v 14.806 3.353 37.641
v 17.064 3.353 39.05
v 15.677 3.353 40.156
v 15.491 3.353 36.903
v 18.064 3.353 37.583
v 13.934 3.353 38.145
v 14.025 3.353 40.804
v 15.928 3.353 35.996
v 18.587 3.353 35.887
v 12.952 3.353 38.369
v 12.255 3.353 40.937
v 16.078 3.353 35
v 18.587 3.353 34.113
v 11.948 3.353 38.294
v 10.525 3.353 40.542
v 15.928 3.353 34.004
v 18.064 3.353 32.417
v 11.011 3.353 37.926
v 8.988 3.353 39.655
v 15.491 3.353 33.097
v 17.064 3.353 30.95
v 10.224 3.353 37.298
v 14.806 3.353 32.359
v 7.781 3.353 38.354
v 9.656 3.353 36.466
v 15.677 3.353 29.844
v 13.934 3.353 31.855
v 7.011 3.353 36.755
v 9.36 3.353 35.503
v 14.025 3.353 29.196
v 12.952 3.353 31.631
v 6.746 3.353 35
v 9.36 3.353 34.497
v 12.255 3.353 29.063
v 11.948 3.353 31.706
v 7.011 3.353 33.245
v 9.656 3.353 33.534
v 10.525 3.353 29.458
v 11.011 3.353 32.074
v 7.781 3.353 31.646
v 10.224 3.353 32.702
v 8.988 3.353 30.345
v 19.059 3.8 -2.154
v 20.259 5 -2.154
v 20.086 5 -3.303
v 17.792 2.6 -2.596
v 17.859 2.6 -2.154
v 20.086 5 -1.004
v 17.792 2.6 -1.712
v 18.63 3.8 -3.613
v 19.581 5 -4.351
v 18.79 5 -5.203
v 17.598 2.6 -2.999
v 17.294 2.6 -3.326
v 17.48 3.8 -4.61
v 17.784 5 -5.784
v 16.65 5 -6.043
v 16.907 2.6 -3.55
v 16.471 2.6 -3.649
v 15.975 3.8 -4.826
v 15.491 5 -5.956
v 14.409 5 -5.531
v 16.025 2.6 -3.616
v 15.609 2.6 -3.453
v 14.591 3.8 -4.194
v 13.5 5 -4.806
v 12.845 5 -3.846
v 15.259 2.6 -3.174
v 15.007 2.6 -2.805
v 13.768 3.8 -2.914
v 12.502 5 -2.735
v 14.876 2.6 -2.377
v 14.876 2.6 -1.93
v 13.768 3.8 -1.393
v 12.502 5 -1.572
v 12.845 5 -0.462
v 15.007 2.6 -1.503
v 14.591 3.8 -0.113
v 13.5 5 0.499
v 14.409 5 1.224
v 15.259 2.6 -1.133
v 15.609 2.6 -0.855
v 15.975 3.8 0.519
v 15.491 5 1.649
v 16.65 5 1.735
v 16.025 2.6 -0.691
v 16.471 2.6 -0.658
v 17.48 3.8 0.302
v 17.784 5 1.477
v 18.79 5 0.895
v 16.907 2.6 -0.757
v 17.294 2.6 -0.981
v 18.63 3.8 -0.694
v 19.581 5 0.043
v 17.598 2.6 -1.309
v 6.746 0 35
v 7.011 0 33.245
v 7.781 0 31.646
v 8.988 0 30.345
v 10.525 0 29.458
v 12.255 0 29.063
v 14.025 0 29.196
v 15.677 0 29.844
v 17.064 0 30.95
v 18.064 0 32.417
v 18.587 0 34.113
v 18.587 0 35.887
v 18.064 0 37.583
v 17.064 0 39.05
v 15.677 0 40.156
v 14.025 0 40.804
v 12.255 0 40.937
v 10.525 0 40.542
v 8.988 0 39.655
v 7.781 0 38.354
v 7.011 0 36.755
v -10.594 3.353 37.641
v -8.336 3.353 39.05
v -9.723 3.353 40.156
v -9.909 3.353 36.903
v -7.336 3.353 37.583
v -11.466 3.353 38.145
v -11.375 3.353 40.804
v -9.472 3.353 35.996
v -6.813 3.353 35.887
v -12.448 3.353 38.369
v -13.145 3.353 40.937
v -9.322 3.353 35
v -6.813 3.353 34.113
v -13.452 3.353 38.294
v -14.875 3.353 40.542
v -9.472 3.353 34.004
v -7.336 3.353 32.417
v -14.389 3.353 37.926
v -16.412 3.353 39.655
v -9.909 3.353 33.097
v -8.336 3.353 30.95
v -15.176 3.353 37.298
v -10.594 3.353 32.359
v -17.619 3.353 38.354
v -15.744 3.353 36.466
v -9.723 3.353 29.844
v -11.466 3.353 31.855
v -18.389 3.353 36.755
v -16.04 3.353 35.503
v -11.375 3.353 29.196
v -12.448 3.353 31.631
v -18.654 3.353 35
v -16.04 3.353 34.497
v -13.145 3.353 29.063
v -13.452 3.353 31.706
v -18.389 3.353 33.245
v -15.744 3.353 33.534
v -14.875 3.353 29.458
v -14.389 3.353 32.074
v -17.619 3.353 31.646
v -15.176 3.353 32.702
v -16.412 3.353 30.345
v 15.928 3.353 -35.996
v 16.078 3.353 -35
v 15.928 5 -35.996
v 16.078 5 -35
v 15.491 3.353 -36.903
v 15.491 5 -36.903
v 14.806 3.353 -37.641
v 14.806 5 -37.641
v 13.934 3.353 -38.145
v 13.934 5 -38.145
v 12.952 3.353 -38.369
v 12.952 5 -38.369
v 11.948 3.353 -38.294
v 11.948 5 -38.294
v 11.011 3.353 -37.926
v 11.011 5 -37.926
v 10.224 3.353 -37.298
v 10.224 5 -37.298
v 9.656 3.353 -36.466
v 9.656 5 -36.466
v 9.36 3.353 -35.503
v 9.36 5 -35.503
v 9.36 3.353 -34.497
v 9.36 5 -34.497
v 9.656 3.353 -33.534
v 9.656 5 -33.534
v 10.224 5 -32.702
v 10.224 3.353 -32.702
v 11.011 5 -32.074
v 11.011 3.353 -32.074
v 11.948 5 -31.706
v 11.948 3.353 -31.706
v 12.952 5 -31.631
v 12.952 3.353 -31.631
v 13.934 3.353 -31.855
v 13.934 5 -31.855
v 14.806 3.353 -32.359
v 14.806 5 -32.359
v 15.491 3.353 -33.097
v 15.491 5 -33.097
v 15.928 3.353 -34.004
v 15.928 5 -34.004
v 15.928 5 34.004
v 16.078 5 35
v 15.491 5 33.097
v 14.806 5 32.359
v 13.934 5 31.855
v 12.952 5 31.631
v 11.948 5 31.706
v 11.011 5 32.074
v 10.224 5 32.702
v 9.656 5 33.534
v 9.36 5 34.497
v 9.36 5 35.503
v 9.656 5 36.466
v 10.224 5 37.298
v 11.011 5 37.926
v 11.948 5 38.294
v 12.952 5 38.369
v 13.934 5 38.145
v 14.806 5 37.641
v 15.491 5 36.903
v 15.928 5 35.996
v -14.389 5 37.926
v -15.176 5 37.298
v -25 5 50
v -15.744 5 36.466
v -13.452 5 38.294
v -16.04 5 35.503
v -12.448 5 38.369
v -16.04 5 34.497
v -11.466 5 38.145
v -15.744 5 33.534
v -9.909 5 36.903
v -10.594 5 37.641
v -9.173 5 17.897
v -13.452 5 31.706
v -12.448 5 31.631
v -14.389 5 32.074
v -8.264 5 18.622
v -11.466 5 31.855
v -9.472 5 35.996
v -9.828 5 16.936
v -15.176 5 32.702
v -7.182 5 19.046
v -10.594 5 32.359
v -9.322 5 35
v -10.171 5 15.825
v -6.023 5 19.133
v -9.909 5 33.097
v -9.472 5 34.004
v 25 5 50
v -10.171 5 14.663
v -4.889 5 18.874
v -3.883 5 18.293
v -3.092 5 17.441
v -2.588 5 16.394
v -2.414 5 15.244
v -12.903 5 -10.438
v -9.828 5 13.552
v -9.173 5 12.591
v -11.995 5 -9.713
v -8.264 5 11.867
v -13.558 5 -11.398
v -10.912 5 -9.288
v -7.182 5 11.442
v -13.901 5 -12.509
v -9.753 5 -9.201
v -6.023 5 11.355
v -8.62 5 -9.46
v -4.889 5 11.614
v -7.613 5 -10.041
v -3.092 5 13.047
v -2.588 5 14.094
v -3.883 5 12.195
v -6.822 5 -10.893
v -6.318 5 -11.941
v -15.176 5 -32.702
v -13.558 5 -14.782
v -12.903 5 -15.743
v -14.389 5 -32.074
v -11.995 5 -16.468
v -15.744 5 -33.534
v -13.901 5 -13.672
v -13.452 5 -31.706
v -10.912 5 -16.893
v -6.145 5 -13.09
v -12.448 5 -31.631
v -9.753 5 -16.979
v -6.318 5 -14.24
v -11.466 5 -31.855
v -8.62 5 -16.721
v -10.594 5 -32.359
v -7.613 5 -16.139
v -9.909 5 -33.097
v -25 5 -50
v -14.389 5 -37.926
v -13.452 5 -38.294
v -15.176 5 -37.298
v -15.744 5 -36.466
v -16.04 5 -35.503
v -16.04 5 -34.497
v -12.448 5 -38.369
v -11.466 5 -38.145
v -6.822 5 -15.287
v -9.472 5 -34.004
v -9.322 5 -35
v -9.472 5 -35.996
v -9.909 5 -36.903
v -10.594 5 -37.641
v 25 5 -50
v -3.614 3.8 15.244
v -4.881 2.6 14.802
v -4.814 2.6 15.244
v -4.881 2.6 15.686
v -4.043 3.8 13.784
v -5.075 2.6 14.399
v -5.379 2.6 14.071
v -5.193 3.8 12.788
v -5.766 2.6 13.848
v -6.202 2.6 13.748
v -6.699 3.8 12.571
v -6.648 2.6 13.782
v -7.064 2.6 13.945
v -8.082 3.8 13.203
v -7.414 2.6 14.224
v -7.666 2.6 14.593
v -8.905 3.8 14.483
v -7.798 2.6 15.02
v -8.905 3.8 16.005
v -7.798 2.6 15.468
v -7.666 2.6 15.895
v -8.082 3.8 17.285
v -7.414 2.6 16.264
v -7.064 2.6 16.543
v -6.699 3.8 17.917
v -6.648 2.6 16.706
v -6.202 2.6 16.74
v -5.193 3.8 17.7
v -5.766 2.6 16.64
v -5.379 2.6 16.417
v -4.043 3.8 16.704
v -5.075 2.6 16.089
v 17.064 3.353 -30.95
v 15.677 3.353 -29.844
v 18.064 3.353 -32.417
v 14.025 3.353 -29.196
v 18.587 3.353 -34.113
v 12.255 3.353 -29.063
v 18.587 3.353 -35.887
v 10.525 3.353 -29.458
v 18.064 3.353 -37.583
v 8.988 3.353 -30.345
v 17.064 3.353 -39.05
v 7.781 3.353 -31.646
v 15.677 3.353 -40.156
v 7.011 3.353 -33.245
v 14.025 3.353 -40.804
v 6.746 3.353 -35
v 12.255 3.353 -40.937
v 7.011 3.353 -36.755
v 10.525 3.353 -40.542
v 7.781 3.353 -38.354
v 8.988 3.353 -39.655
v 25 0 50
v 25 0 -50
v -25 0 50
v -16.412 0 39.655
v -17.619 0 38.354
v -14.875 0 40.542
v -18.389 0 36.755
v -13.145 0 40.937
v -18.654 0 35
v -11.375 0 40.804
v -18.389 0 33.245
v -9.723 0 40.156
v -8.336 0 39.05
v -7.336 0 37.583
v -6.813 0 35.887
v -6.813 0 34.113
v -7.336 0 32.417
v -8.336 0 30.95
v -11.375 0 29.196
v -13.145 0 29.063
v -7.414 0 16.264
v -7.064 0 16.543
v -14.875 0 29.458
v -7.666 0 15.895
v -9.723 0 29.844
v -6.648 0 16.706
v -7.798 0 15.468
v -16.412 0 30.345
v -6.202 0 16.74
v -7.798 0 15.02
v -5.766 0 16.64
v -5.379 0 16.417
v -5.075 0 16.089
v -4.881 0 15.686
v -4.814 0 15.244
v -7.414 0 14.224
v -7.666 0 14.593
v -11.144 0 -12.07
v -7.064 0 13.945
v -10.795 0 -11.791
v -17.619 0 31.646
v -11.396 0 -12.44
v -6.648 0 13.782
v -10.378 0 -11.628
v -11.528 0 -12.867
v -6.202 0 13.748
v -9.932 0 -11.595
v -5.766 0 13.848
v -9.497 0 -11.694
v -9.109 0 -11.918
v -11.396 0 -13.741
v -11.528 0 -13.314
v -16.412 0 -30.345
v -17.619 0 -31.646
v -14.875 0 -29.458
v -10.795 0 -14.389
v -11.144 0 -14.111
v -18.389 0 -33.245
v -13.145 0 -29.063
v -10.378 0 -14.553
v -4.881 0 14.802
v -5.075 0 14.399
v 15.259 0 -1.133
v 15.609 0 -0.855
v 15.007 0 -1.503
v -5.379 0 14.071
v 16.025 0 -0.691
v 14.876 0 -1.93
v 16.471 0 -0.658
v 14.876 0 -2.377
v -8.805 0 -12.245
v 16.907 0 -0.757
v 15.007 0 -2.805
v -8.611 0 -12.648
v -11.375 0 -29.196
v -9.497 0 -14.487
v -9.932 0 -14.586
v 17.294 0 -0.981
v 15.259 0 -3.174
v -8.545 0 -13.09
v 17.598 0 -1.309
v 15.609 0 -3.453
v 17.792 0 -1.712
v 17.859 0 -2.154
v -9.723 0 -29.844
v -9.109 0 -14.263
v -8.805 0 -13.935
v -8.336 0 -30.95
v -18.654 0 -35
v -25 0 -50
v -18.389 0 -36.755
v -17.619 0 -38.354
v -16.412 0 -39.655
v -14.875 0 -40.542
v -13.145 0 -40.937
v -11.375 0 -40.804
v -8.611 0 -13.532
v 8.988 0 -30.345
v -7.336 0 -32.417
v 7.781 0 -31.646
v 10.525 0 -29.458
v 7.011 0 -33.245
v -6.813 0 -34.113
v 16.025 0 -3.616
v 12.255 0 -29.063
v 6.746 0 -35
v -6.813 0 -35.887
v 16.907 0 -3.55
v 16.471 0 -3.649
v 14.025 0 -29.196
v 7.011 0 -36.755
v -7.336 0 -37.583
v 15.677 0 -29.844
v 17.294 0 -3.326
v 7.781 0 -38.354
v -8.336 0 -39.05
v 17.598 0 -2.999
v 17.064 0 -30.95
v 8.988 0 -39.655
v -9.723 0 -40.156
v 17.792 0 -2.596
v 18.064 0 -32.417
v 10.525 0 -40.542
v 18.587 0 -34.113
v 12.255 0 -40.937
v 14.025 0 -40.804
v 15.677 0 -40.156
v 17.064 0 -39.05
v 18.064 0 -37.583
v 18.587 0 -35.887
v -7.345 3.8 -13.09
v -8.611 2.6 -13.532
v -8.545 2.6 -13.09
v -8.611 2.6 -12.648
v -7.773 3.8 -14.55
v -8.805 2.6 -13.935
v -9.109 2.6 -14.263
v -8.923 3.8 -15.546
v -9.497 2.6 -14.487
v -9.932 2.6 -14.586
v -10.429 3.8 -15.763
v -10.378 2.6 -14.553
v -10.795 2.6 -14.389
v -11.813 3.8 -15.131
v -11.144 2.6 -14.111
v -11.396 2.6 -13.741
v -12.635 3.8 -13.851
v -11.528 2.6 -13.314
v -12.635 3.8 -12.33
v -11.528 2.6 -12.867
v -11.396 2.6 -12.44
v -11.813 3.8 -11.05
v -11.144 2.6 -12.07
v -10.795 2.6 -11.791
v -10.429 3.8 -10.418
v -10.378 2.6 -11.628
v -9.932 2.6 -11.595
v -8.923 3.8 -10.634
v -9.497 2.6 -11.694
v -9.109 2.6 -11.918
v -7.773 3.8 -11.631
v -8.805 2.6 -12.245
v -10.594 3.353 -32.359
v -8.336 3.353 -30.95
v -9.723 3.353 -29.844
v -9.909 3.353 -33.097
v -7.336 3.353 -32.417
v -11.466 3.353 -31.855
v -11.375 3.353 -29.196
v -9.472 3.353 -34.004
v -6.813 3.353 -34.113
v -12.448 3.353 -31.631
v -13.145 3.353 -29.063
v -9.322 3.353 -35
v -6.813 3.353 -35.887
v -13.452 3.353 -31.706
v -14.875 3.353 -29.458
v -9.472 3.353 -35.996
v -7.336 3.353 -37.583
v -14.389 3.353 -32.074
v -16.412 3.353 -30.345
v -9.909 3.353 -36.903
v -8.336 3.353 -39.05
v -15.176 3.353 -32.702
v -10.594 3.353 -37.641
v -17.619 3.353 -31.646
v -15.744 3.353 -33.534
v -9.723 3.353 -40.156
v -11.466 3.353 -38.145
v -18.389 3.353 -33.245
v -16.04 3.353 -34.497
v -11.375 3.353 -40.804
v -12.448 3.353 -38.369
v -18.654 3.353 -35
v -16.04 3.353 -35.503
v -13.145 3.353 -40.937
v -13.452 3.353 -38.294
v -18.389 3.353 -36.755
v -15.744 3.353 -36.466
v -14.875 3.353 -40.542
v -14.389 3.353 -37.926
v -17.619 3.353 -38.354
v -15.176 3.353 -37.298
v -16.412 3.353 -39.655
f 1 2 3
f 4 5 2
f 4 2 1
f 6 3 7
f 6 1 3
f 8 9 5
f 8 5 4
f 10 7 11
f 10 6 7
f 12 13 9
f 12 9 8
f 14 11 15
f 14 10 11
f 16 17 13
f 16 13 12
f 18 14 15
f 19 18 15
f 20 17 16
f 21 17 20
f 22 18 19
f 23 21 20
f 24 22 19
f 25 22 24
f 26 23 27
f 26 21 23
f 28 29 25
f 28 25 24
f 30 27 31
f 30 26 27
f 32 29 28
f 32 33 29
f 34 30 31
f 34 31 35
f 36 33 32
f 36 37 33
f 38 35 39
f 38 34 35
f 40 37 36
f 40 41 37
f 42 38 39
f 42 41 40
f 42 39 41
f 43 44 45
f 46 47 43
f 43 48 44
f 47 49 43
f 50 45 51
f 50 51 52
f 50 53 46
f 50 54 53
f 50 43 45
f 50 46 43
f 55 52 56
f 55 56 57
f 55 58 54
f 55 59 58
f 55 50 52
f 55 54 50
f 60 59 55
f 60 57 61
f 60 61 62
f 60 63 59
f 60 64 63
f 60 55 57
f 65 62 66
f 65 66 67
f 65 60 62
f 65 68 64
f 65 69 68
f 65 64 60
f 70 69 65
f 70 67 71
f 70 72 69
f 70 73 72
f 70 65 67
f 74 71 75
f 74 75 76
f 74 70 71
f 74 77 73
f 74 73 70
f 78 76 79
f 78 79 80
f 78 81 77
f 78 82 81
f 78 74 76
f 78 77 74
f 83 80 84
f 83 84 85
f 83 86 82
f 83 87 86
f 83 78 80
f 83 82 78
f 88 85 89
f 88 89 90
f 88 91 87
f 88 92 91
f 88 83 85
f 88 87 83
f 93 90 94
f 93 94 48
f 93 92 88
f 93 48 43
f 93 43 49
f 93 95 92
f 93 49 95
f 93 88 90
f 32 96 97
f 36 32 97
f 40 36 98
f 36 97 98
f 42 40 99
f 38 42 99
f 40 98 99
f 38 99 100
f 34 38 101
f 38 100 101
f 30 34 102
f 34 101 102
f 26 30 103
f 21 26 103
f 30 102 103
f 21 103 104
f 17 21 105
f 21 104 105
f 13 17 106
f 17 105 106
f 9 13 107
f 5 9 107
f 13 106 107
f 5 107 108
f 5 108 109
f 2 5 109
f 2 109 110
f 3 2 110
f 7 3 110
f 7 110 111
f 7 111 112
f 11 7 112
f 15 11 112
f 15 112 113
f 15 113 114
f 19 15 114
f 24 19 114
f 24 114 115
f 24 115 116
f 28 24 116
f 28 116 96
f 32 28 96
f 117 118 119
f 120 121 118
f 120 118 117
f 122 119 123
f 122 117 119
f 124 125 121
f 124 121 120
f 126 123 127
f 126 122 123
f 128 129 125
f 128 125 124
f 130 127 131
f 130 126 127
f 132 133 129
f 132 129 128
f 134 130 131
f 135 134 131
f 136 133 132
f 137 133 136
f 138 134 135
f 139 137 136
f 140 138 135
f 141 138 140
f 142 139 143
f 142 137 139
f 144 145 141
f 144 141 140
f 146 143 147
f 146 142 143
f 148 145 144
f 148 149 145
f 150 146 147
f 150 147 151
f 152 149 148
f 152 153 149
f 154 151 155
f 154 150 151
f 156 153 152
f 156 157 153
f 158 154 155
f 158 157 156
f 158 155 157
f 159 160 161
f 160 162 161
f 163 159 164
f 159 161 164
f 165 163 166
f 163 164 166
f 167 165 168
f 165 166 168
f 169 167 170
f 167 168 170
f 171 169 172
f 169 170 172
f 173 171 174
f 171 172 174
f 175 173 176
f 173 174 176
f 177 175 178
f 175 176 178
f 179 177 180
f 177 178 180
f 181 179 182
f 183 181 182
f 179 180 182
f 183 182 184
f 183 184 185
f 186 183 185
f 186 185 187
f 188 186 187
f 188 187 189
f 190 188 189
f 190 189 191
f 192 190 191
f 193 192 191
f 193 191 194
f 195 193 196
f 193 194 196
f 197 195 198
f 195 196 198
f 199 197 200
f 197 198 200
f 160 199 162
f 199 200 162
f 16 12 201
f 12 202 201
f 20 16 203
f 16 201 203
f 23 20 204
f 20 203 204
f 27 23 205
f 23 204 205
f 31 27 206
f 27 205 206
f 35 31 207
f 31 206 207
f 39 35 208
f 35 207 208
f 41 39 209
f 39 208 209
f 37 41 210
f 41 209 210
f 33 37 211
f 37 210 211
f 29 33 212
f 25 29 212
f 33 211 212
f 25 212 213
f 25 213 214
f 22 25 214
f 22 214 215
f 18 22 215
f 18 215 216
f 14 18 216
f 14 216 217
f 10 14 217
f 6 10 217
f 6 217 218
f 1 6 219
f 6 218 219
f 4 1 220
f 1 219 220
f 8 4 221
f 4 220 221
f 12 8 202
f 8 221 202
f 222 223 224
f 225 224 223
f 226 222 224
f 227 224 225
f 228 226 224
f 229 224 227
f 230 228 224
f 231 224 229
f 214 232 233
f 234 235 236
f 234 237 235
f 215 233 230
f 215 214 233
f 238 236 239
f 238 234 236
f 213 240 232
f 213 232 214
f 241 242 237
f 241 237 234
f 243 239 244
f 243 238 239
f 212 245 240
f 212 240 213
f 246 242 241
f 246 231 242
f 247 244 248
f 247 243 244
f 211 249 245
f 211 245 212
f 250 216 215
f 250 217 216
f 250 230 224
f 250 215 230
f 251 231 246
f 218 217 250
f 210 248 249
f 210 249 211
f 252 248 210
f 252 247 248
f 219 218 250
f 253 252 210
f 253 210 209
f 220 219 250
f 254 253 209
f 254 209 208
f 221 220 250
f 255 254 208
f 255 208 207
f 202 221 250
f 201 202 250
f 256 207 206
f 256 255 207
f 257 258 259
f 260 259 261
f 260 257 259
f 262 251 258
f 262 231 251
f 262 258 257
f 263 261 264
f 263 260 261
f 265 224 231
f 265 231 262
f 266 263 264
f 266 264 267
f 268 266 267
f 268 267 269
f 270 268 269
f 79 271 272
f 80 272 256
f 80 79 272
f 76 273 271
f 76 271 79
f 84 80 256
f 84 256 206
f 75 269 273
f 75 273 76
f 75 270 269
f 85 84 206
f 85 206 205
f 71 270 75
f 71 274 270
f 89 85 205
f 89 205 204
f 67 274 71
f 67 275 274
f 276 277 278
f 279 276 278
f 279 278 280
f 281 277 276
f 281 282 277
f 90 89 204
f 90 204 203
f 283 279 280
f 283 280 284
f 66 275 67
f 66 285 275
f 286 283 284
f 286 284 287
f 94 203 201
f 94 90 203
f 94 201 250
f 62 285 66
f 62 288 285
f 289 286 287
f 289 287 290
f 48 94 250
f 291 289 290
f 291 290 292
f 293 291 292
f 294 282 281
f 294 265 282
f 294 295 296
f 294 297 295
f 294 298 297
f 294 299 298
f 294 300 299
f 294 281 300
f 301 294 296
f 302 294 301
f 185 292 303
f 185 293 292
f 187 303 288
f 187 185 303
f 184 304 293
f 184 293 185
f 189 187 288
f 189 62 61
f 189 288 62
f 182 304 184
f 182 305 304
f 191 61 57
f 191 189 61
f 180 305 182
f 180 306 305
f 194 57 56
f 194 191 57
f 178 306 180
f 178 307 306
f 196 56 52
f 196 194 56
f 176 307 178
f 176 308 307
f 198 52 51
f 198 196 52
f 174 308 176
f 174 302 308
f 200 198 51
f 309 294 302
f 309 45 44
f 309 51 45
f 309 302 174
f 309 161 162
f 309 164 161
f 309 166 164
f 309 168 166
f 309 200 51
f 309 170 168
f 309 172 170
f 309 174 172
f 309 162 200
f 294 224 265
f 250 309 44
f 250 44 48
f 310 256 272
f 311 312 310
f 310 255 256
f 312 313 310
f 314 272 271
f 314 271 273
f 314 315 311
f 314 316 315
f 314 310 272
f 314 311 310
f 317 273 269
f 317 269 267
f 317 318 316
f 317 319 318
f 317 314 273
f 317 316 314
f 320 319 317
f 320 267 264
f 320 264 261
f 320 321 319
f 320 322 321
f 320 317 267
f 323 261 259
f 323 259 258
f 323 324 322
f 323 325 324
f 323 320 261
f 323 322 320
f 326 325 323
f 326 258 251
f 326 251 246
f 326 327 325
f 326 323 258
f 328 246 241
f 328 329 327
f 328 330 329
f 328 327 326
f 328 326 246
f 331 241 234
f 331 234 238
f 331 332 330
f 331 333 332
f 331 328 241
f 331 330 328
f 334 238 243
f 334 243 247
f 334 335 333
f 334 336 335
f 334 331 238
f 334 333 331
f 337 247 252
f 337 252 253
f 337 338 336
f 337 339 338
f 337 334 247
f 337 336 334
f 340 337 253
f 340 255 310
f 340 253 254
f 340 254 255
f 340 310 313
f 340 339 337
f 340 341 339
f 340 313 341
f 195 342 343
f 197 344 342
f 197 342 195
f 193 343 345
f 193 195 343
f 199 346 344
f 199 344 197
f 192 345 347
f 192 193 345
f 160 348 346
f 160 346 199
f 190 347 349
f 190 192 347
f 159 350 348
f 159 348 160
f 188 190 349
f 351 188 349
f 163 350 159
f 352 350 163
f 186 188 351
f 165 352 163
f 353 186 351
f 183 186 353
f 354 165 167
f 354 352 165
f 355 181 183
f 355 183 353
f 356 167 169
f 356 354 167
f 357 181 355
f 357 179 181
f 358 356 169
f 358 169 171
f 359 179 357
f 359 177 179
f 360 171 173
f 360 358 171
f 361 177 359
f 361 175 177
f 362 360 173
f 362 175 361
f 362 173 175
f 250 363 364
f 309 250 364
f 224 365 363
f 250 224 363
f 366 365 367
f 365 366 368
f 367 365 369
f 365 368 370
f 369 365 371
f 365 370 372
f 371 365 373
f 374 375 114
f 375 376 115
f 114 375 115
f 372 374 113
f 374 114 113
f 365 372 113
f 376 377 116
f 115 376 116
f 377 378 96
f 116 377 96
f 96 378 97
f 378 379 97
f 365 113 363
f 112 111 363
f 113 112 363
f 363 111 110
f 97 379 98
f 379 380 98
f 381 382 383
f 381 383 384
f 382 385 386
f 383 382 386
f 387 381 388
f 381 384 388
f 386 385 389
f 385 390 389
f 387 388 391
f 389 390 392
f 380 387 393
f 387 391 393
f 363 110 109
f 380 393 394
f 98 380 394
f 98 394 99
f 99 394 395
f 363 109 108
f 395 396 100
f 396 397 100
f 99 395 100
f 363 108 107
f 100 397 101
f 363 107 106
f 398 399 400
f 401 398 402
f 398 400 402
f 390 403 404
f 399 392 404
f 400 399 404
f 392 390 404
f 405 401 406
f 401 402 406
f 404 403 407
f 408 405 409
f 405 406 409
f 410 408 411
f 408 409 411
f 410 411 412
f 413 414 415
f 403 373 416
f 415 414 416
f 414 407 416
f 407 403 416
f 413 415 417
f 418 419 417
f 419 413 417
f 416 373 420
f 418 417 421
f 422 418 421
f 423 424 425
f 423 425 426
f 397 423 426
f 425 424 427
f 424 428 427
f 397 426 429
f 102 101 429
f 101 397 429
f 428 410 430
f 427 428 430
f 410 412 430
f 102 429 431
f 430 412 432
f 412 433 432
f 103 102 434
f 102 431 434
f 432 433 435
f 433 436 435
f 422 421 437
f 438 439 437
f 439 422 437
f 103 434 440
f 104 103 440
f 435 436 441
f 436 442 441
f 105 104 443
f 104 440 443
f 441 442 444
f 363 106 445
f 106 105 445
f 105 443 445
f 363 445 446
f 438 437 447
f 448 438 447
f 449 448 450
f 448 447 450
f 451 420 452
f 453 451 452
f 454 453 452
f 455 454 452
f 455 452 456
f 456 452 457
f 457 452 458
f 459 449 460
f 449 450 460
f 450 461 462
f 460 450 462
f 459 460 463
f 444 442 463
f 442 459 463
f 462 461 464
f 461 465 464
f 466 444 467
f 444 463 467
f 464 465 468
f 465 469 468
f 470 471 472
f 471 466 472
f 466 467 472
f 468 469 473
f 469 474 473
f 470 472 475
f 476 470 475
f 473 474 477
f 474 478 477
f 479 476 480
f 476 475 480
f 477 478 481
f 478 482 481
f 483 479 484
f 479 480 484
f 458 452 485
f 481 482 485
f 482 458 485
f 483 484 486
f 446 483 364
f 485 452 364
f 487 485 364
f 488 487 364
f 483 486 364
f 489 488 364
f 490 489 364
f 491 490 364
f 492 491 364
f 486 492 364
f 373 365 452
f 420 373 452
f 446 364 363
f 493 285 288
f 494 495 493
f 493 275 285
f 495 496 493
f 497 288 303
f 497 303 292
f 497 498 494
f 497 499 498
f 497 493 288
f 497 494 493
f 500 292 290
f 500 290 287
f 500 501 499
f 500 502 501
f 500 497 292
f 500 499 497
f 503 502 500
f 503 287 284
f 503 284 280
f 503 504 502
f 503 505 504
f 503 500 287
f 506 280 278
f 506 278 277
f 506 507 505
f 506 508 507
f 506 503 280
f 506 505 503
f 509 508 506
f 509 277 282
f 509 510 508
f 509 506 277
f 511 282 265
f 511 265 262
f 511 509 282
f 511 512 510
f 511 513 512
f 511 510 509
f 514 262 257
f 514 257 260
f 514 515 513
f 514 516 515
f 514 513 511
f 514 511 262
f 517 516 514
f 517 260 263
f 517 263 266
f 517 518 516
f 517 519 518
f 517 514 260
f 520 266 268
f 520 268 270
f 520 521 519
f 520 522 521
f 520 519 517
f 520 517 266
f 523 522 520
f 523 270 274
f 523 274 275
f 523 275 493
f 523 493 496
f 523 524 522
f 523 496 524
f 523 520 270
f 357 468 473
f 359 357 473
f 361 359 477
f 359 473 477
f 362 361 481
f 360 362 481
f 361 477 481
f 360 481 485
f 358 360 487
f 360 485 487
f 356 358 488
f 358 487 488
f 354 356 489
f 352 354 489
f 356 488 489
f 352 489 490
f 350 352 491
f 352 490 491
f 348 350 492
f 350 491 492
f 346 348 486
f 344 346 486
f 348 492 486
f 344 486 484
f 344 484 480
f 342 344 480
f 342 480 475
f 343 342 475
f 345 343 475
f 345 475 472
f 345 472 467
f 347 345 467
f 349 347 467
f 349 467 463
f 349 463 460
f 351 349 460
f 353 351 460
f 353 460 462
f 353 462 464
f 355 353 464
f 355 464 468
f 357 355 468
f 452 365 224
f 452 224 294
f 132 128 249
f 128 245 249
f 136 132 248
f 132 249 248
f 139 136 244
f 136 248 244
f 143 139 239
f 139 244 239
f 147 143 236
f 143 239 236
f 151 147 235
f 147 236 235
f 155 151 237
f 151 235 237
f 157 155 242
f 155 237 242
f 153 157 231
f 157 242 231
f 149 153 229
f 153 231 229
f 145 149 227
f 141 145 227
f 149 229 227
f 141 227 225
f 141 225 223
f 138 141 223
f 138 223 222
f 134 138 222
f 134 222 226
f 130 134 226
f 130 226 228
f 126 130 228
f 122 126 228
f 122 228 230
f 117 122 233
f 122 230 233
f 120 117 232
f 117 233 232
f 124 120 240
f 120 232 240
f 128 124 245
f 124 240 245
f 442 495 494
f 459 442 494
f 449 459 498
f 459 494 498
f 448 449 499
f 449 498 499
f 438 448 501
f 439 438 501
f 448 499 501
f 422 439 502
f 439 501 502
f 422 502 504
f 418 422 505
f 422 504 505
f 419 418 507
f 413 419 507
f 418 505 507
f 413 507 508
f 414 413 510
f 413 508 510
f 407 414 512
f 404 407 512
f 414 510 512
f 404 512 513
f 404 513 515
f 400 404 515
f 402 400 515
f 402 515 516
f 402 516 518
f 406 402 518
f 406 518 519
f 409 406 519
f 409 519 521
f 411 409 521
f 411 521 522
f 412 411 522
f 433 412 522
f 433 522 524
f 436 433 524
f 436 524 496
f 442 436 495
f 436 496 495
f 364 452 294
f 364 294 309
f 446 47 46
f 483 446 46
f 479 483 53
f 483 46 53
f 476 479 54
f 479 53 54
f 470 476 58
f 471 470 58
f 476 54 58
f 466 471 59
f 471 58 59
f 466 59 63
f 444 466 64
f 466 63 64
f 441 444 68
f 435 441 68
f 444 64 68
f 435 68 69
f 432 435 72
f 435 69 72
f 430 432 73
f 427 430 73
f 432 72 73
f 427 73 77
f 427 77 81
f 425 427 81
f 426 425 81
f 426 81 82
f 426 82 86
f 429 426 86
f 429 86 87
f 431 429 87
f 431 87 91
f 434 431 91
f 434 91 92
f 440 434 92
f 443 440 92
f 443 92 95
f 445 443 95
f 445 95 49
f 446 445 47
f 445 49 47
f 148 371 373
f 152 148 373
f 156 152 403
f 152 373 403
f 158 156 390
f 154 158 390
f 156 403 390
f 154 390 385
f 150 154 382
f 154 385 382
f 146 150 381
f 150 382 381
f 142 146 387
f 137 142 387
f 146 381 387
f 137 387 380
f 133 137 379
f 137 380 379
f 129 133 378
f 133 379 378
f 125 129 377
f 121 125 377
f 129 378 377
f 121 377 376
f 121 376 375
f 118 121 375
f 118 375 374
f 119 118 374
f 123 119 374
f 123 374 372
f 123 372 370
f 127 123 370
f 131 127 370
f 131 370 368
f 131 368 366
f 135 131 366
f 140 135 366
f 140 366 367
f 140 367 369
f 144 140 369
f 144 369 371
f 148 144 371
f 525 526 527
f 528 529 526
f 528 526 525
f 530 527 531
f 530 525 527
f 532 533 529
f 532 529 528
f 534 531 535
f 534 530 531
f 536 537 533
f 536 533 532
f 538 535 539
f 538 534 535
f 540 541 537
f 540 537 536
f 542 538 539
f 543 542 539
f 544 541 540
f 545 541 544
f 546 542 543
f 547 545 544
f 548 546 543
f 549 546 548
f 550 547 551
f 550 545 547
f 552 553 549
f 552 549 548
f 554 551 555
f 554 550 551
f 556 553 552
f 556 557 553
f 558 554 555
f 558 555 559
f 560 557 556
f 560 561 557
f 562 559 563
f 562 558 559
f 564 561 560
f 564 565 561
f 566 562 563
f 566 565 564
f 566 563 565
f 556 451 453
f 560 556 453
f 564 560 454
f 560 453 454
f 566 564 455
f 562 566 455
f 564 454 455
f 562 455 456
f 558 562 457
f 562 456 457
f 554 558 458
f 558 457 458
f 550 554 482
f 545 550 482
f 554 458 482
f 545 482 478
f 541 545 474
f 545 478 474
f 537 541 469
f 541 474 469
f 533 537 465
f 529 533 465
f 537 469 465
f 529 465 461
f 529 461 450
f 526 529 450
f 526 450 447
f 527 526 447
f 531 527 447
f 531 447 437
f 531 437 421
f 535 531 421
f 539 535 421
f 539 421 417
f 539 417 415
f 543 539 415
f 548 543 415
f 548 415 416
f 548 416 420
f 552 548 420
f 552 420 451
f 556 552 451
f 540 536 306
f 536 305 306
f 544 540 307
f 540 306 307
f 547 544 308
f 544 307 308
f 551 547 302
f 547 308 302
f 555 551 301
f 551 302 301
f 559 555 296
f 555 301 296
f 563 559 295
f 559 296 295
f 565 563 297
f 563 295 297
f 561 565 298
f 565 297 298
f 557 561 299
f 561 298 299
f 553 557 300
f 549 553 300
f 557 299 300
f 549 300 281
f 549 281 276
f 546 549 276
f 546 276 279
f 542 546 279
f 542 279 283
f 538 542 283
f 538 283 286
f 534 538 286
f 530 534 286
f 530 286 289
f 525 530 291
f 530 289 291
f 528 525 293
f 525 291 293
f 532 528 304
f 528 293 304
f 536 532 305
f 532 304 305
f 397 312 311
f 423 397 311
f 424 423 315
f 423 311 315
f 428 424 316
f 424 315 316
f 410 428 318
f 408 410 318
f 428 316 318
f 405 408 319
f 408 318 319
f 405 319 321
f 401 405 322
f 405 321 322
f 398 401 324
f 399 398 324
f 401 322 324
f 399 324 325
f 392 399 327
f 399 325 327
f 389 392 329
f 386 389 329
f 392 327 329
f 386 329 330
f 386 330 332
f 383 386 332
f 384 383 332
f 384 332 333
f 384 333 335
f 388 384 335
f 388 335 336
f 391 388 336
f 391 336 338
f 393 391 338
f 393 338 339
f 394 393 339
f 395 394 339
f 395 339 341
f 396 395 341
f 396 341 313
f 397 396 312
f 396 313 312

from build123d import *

# Parameters (mm, degrees)
SKETCH1_W                                        = 50
SKETCH1_H                                        = 100
BOSS_EXTRUDE1_DEPTH                              = 5
SKETCH3_R                                        = 1.5
CUT_EXTRUDE2_DEPTH                               = 5
CHAMFER1_SIZE                                    = 2.4
CBORE_FOR_1_4_BUTTON_HEAD_CAP_SCREW2_D           = 6.7564
CBORE_FOR_1_4_BUTTON_HEAD_CAP_SCREW2_CBORE_D     = 11.90752
CBORE_FOR_1_4_BUTTON_HEAD_CAP_SCREW2_CBORE_DEPTH = 3.3528


with BuildPart() as part:
    # Sketch1 → Boss-Extrude1 (new body)
    with BuildSketch(Plane(origin=(0, 0, 0), x_dir=(1, 0, 0), z_dir=(0, 1, 0))):
        Rectangle(SKETCH1_W, SKETCH1_H)
    extrude(amount=BOSS_EXTRUDE1_DEPTH)

    # Sketch3 → Cut-Extrude2 (cut)
    with BuildSketch(Plane(origin=(0, 5, 0), x_dir=(1, 0, 0), z_dir=(0, 1, 0))):
        with Locations((-6.314276634, -15.244012286)):
            Circle(SKETCH3_R)
        with Locations((16.358840213, 2.153682172)):
            Circle(SKETCH3_R)
        with Locations((-10.044563579, 13.090330115)):
            Circle(SKETCH3_R)
    extrude(amount=-CUT_EXTRUDE2_DEPTH, mode=Mode.SUBTRACT)

    # Chamfer1
    chamfer1_edges = [part.edges().sort_by_distance(p)[0] for p in [
        (-7.814276634, 5, 15.244012286),
        (14.858840213, 5, -2.153682172),
        (-11.544563579, 5, -13.090330115),
    ]]
    chamfer(chamfer1_edges, length=CHAMFER1_SIZE)

    # CBORE for 1/4 Button Head Cap Screw2 (through all)
    with Locations(Plane(origin=(0, 0, 0), x_dir=(-1, 0, 0), z_dir=(0, -1, 0))):
        with Locations((12.7, -35), (-12.7, -35), (-12.7, 35), (12.7, 35)):
            CounterBoreHole(CBORE_FOR_1_4_BUTTON_HEAD_CAP_SCREW2_D / 2, CBORE_FOR_1_4_BUTTON_HEAD_CAP_SCREW2_CBORE_D / 2, CBORE_FOR_1_4_BUTTON_HEAD_CAP_SCREW2_CBORE_DEPTH)


solid = part.part
